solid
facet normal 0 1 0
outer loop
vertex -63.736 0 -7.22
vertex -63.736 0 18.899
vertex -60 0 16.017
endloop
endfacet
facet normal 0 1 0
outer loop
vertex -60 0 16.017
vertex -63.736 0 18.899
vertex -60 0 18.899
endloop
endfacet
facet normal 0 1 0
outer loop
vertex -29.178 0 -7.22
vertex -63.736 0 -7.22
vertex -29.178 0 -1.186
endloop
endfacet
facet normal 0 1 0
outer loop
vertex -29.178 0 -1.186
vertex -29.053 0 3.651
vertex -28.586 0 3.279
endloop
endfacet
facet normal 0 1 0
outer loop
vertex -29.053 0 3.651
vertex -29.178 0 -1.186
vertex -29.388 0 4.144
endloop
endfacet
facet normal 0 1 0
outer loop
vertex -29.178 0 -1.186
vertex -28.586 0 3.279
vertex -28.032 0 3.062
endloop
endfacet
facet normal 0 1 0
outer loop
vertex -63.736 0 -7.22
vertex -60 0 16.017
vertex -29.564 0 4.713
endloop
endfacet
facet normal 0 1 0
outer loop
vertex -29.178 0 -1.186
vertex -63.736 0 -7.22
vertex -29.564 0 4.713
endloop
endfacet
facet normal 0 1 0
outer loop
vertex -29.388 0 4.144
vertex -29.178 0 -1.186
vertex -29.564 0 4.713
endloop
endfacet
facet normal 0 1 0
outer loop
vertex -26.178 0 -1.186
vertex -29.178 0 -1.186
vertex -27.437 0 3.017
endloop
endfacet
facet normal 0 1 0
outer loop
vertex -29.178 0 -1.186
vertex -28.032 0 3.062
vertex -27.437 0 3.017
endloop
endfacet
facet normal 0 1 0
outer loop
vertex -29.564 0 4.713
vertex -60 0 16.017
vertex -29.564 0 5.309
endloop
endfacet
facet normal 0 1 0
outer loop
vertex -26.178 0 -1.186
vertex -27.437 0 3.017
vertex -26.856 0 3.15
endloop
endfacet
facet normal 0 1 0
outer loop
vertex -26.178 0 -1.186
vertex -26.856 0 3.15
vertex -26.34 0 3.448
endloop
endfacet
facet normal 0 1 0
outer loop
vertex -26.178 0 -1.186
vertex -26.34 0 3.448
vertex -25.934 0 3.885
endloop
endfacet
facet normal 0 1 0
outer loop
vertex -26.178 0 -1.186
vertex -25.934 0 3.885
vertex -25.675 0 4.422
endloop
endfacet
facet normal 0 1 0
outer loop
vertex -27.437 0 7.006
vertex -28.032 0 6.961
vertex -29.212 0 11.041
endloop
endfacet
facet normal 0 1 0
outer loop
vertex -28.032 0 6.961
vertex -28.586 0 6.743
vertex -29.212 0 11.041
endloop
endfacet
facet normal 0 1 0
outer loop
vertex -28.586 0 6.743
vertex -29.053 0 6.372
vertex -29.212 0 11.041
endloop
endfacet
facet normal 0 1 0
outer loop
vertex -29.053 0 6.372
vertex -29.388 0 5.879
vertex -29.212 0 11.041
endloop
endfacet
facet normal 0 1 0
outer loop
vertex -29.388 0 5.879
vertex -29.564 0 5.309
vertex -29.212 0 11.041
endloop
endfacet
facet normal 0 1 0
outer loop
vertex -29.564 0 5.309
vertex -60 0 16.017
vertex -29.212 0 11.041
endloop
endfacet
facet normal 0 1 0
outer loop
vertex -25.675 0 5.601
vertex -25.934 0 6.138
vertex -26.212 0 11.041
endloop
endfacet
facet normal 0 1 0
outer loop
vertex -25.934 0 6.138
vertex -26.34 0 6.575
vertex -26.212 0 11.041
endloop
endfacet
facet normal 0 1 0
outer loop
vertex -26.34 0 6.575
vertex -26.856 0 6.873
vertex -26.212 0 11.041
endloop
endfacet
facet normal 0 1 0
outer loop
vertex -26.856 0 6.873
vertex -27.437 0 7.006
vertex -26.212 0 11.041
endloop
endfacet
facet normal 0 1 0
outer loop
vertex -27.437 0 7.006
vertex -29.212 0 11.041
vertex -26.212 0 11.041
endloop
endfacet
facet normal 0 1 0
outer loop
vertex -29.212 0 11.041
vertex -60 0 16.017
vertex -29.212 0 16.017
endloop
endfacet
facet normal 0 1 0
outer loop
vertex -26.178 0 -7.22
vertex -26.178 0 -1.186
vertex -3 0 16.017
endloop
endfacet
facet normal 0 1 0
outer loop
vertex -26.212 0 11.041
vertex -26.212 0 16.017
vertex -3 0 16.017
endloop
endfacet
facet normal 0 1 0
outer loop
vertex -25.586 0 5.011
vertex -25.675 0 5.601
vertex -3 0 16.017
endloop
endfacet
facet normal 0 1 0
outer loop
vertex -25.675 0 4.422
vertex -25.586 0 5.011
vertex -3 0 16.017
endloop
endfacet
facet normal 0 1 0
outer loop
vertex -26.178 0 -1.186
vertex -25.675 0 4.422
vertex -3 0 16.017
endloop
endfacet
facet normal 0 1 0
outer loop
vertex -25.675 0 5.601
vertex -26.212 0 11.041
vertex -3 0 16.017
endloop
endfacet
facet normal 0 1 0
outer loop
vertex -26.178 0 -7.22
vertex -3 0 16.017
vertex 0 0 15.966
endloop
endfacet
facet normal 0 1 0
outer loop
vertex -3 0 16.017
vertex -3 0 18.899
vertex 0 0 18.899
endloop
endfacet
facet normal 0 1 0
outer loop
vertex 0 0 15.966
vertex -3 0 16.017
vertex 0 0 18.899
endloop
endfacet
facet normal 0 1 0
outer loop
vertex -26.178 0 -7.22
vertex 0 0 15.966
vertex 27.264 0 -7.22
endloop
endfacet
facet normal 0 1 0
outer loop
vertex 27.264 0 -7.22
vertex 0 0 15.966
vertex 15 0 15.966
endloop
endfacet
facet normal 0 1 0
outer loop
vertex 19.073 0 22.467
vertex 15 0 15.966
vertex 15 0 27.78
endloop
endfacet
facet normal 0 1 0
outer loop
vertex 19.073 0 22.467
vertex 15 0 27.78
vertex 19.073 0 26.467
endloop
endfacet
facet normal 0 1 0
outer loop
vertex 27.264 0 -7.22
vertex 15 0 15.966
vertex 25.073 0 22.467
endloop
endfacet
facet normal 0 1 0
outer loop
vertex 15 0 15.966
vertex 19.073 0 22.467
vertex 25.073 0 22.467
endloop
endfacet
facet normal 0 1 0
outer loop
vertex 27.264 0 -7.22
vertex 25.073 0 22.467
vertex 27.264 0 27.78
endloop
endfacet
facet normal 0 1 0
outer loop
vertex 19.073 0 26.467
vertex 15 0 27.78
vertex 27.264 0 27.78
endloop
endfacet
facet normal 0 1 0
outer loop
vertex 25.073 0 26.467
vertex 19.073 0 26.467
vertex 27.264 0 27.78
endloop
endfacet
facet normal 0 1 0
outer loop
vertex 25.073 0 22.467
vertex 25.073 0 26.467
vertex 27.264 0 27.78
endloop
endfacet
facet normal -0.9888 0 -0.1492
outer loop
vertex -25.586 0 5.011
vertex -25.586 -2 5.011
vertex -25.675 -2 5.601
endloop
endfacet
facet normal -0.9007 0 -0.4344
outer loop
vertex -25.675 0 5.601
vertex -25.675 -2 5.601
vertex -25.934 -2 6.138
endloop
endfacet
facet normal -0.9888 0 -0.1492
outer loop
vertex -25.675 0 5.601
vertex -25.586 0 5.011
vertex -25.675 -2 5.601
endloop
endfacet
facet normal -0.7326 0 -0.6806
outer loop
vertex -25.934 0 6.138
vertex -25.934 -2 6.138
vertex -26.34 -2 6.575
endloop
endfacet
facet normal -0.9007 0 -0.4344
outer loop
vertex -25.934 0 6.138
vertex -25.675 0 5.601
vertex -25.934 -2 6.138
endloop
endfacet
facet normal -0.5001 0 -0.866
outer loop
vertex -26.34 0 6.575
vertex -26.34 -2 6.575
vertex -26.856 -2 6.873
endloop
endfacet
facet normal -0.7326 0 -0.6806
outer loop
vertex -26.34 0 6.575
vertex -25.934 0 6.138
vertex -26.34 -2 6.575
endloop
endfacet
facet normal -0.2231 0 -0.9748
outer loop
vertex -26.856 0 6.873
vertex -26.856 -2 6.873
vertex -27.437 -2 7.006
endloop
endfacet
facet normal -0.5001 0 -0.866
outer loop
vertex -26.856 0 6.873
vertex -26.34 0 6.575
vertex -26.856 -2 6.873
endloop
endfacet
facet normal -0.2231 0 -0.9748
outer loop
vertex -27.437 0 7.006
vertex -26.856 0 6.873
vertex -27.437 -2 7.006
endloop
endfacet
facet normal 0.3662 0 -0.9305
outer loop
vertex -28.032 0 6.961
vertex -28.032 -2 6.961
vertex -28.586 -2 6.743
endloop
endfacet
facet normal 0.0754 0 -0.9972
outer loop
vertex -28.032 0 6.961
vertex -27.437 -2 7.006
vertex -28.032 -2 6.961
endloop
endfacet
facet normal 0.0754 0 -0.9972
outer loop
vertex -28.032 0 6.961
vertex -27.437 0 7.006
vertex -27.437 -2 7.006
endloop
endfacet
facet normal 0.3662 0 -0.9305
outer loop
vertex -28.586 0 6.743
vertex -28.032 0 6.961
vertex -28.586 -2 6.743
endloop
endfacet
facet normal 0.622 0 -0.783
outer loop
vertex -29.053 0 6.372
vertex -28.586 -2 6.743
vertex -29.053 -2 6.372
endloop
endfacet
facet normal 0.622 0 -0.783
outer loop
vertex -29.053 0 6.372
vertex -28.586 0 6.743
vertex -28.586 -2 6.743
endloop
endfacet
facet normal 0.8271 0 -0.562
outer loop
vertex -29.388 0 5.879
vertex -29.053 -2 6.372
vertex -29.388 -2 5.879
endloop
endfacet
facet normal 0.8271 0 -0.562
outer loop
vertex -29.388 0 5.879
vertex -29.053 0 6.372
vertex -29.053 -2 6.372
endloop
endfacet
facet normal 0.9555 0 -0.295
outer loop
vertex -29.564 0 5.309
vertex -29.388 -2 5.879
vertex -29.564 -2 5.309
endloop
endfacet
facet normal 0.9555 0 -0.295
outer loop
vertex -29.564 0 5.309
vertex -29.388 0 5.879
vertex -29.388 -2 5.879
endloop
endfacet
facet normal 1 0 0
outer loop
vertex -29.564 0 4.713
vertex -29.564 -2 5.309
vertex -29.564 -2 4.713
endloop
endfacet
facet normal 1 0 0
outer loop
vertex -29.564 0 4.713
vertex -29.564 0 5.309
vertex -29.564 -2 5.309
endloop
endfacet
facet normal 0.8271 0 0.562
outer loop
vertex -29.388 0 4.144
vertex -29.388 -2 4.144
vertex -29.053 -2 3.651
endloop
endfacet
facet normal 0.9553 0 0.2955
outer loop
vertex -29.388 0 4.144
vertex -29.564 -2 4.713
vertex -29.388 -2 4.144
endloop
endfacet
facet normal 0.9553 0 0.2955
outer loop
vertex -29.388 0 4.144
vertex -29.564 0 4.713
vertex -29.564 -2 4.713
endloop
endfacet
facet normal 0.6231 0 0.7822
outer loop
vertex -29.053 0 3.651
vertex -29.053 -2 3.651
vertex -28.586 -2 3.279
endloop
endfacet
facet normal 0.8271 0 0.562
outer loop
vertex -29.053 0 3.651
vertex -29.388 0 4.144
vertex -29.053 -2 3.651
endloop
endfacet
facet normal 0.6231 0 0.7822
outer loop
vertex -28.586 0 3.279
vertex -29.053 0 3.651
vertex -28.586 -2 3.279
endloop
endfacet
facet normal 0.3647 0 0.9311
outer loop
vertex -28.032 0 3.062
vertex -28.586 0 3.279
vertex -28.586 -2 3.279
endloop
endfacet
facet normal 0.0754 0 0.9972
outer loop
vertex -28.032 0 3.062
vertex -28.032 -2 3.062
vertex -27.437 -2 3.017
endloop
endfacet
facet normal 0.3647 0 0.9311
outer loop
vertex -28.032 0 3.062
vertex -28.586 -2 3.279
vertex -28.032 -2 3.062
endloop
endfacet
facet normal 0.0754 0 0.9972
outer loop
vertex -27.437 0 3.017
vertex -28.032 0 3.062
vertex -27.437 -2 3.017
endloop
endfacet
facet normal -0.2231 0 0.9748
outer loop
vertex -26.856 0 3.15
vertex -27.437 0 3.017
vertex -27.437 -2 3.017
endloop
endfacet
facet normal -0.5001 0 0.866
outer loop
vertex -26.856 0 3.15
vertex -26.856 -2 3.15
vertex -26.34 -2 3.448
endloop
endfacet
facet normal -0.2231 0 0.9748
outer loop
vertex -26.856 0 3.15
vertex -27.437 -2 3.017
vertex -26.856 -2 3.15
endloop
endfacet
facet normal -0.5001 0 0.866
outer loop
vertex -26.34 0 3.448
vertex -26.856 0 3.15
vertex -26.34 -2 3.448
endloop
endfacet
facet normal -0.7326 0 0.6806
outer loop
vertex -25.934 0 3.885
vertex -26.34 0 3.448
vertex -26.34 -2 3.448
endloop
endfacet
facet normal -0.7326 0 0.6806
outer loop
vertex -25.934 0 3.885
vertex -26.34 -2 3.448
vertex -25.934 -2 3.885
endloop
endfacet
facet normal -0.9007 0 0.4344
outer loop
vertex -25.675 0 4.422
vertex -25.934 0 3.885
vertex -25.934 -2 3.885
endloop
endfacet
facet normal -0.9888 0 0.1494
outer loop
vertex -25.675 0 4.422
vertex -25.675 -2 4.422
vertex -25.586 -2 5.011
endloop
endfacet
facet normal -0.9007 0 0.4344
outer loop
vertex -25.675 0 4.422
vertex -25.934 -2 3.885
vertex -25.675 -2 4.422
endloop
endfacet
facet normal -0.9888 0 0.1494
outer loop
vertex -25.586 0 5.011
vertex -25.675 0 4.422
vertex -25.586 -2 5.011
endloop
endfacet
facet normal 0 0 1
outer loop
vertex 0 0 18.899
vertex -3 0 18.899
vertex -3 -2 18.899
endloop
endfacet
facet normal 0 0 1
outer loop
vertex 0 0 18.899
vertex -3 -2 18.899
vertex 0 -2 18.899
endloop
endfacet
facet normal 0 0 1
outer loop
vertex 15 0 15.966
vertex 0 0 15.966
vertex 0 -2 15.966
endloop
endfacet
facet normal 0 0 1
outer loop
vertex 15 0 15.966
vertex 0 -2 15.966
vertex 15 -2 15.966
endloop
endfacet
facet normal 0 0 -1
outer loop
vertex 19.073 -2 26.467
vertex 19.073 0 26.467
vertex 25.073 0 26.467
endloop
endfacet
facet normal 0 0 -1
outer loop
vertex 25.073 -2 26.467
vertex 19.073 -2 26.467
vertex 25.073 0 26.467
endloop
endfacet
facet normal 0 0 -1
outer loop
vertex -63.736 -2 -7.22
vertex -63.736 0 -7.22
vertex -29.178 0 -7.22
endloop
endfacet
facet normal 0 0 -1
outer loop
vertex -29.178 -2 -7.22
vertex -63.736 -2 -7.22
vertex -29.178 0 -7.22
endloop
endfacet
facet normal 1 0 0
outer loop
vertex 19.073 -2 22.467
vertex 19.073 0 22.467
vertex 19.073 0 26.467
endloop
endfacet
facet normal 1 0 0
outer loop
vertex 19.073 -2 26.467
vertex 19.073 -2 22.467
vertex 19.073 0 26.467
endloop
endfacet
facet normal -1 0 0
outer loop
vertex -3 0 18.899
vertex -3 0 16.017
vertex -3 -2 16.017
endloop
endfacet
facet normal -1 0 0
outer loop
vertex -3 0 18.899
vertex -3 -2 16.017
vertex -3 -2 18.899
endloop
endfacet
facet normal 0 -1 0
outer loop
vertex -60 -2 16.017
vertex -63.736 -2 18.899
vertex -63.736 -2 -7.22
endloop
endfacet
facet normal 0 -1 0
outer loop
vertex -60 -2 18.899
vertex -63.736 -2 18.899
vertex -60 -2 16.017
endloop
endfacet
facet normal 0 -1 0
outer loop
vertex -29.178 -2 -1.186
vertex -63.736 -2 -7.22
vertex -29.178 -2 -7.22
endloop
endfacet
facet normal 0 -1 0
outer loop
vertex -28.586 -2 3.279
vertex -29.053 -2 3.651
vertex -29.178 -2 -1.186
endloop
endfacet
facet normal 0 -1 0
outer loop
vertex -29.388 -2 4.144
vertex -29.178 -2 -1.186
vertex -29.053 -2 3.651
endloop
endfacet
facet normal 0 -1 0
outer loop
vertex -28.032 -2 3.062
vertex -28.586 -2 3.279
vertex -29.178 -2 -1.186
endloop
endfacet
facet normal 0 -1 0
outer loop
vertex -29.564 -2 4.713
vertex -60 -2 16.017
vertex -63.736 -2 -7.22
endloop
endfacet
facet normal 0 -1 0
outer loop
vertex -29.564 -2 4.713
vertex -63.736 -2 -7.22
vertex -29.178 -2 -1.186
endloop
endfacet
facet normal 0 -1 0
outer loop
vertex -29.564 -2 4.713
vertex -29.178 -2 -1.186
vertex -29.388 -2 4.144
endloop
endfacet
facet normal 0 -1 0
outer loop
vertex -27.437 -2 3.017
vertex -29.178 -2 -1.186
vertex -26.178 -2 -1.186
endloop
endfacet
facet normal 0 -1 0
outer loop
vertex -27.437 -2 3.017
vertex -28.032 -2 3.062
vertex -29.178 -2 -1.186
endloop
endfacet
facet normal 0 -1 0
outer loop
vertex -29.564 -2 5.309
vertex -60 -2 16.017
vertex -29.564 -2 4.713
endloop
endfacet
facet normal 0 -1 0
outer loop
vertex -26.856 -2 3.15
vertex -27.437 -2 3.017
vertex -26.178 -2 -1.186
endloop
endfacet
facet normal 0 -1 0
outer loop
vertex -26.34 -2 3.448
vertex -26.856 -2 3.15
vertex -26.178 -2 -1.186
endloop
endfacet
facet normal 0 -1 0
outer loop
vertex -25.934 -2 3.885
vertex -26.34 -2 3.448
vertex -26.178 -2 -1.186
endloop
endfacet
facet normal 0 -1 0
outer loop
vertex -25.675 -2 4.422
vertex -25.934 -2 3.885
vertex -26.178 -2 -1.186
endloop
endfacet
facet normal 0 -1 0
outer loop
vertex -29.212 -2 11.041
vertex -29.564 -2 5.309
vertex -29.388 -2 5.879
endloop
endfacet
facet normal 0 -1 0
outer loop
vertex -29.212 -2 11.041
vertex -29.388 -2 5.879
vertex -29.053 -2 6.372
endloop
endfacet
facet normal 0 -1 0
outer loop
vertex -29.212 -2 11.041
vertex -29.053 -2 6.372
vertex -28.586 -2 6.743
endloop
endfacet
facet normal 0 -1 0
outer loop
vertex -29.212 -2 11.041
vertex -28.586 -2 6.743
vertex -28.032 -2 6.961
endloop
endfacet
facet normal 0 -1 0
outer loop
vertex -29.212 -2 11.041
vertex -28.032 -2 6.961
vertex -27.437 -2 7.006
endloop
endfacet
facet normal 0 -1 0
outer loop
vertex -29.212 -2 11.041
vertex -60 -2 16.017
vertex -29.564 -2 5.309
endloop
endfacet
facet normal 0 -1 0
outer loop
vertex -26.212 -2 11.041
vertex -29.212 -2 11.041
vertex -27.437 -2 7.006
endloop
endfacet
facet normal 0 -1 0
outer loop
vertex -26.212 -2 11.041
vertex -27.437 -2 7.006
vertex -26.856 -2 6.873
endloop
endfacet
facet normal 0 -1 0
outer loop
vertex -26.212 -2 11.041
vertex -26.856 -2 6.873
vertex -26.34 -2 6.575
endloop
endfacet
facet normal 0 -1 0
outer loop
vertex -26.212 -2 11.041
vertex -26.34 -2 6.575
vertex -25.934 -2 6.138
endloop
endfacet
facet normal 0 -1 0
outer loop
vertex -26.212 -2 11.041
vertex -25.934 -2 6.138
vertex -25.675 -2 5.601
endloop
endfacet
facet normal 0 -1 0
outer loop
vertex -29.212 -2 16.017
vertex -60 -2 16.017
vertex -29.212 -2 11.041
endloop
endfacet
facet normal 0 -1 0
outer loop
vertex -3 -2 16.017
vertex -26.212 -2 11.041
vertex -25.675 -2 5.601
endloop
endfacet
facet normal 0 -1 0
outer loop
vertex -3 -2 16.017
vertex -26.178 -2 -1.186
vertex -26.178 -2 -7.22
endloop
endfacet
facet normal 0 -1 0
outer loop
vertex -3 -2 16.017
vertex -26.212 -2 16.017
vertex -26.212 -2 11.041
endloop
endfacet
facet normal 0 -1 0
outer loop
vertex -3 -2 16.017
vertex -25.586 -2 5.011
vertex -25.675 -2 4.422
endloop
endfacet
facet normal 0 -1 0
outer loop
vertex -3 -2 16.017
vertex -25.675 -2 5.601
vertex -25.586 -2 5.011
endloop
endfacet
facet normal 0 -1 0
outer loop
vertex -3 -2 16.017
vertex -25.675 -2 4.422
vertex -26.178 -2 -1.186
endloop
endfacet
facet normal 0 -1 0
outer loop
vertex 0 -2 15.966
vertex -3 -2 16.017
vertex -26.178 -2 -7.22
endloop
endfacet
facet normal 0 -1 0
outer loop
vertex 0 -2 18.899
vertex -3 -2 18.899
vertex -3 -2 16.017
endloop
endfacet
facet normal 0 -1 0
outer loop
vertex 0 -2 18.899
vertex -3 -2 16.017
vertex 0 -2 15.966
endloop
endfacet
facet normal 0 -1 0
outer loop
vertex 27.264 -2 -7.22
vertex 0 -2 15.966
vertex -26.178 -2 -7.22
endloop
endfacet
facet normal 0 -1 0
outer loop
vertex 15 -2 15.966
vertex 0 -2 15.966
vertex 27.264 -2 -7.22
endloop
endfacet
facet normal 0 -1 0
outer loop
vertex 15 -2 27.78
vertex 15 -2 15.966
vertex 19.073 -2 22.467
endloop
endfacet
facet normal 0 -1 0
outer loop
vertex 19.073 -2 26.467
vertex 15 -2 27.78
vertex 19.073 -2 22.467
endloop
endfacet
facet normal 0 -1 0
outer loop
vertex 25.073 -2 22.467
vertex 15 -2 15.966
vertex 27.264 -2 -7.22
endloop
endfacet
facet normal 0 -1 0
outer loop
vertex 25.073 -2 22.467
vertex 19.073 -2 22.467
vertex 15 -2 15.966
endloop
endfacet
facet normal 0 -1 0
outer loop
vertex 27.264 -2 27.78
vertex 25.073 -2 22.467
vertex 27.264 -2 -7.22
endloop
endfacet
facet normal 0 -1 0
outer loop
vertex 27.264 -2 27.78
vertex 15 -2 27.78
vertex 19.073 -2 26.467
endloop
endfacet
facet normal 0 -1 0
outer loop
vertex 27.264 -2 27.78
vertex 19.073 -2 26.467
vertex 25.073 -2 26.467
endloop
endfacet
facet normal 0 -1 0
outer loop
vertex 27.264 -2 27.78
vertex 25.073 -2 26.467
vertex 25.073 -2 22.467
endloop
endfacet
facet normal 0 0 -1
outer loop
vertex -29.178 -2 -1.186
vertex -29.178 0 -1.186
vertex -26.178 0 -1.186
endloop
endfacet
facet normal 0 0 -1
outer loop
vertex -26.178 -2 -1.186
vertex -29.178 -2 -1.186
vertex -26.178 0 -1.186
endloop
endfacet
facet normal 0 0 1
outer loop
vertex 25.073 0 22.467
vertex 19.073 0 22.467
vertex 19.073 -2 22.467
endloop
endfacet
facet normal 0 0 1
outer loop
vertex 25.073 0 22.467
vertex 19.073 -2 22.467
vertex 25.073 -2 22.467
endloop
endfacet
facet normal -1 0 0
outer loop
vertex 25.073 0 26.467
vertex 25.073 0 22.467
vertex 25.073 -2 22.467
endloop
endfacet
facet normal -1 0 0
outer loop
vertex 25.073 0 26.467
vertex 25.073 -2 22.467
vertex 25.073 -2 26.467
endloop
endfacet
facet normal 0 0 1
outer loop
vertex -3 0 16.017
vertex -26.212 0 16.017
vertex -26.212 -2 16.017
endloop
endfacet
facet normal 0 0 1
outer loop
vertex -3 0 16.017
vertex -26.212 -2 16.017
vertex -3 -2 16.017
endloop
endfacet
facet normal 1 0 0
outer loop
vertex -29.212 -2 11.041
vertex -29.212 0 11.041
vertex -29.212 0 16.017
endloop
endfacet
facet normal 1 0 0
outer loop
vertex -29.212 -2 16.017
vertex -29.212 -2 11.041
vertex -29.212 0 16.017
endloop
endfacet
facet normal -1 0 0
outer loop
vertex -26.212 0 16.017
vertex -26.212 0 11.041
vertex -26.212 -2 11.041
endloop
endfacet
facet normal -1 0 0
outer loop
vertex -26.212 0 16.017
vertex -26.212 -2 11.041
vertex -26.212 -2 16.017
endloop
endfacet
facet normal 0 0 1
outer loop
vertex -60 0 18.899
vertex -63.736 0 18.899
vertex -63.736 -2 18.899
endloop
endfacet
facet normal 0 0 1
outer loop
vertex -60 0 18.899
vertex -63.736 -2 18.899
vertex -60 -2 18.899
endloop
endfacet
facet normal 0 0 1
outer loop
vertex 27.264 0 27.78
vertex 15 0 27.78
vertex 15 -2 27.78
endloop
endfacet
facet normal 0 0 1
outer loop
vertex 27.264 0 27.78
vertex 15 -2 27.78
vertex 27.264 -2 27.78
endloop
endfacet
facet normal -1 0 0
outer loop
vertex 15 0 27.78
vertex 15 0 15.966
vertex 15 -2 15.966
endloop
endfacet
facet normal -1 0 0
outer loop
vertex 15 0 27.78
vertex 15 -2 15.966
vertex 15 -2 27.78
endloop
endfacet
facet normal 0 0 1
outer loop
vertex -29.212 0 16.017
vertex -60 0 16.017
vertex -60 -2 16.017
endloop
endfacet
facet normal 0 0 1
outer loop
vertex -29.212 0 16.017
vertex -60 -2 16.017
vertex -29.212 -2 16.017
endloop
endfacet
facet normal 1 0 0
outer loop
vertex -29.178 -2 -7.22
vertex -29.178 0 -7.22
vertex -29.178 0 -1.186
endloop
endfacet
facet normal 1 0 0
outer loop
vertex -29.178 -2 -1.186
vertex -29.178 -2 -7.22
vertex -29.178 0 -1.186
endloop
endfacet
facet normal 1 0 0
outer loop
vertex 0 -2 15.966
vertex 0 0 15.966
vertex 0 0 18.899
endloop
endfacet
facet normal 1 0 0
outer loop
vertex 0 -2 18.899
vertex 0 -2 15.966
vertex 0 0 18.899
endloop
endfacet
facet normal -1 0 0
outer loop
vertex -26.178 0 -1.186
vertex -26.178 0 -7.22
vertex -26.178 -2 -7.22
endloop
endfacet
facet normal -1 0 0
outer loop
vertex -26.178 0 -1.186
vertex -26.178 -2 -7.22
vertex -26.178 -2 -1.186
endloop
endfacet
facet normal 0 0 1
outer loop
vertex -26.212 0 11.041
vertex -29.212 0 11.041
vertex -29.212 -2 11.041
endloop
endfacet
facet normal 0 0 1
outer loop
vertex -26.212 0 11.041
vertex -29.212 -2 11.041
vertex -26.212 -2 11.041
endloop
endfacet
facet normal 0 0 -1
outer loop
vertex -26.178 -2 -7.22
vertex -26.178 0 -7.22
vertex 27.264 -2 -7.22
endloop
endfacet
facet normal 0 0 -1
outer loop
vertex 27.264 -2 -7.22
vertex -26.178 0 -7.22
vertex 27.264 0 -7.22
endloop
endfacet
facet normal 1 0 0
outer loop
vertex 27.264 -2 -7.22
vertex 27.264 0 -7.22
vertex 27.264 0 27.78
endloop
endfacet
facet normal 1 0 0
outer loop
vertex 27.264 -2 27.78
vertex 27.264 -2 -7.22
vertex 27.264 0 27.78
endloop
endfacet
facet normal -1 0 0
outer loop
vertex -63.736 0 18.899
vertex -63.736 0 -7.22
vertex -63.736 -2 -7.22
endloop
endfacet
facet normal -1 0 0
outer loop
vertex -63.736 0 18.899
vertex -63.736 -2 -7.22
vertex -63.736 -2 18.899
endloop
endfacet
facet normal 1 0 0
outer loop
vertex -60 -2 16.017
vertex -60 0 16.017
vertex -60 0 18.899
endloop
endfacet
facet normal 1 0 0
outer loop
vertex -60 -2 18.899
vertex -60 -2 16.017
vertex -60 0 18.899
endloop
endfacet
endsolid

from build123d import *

# Parameters (mm, degrees)
F0_W      = 91
F0_H      = 35
F1_DEPTH  = 2
F2_W      = 15
F2_H      = 12
F3_DEPTH  = 3
F5_DEPTH  = 5
F6_W      = 57
F6_H      = 3
F7_DEPTH  = 3
F8_W      = 3
F8_H      = 5
F9_DEPTH  = 9
F10_W     = 3
F10_H     = 6.3
F11_DEPTH = 4
F12_R     = 2
F13_DEPTH = 4
F14_W     = 6
F14_H     = 4
F15_DEPTH = 4


with BuildPart() as f1:
    # F0 (on Front) → F1 (new body)
    with BuildSketch(Plane.XZ):
        with Locations((-18.235627, 10.280461)):
            Rectangle(F0_W, F0_H)
    extrude(amount=F1_DEPTH)

    # F2 (on Front) → F3 (cut)
    with BuildSketch(Plane.XZ):
        with Locations((7.5, 21.966114)):
            Rectangle(F2_W, F2_H)
    extrude(amount=F3_DEPTH, mode=Mode.SUBTRACT)

    # F4 (on Front) → F5 (cut)
    with BuildSketch(Plane.XZ):
        Polygon((-65.685175, 18.899074), (0, 18.899074), (0, 18.929425), (0, 28.964864), (-65.685175, 28.964864), align=None)
    extrude(amount=F5_DEPTH, mode=Mode.SUBTRACT)

    # F6 (on Front) → F7 (cut)
    with BuildSketch(Plane.XZ):
        with Locations((-31.5, 17.516951)):
            Rectangle(F6_W, F6_H)
    extrude(amount=F7_DEPTH, mode=Mode.SUBTRACT)

    # F8 (on Front) → F9 (cut)
    with BuildSketch(Plane.XZ):
        with Locations((-27.711618, 13.540782)):
            Rectangle(F8_W, F8_H)
    extrude(amount=F9_DEPTH, mode=Mode.SUBTRACT)

    # F10 (on Front) → F11 (cut)
    with BuildSketch(Plane.XZ):
        with Locations((-27.678377, -4.335782)):
            Rectangle(F10_W, F10_H)
    extrude(amount=F11_DEPTH, mode=Mode.SUBTRACT)

    # F12 (on Front) → F13 (cut)
    with BuildSketch(Plane.XZ):
        with Locations((-27.586486, 5.011399)):
            Circle(F12_R)
    extrude(amount=F13_DEPTH, mode=Mode.SUBTRACT)

    # F14 (on Front) → F15 (cut)
    with BuildSketch(Plane.XZ):
        with Locations((22.072674, 24.467368)):
            Rectangle(F14_W, F14_H)
    extrude(amount=F15_DEPTH, mode=Mode.SUBTRACT)


solid = f1.part
